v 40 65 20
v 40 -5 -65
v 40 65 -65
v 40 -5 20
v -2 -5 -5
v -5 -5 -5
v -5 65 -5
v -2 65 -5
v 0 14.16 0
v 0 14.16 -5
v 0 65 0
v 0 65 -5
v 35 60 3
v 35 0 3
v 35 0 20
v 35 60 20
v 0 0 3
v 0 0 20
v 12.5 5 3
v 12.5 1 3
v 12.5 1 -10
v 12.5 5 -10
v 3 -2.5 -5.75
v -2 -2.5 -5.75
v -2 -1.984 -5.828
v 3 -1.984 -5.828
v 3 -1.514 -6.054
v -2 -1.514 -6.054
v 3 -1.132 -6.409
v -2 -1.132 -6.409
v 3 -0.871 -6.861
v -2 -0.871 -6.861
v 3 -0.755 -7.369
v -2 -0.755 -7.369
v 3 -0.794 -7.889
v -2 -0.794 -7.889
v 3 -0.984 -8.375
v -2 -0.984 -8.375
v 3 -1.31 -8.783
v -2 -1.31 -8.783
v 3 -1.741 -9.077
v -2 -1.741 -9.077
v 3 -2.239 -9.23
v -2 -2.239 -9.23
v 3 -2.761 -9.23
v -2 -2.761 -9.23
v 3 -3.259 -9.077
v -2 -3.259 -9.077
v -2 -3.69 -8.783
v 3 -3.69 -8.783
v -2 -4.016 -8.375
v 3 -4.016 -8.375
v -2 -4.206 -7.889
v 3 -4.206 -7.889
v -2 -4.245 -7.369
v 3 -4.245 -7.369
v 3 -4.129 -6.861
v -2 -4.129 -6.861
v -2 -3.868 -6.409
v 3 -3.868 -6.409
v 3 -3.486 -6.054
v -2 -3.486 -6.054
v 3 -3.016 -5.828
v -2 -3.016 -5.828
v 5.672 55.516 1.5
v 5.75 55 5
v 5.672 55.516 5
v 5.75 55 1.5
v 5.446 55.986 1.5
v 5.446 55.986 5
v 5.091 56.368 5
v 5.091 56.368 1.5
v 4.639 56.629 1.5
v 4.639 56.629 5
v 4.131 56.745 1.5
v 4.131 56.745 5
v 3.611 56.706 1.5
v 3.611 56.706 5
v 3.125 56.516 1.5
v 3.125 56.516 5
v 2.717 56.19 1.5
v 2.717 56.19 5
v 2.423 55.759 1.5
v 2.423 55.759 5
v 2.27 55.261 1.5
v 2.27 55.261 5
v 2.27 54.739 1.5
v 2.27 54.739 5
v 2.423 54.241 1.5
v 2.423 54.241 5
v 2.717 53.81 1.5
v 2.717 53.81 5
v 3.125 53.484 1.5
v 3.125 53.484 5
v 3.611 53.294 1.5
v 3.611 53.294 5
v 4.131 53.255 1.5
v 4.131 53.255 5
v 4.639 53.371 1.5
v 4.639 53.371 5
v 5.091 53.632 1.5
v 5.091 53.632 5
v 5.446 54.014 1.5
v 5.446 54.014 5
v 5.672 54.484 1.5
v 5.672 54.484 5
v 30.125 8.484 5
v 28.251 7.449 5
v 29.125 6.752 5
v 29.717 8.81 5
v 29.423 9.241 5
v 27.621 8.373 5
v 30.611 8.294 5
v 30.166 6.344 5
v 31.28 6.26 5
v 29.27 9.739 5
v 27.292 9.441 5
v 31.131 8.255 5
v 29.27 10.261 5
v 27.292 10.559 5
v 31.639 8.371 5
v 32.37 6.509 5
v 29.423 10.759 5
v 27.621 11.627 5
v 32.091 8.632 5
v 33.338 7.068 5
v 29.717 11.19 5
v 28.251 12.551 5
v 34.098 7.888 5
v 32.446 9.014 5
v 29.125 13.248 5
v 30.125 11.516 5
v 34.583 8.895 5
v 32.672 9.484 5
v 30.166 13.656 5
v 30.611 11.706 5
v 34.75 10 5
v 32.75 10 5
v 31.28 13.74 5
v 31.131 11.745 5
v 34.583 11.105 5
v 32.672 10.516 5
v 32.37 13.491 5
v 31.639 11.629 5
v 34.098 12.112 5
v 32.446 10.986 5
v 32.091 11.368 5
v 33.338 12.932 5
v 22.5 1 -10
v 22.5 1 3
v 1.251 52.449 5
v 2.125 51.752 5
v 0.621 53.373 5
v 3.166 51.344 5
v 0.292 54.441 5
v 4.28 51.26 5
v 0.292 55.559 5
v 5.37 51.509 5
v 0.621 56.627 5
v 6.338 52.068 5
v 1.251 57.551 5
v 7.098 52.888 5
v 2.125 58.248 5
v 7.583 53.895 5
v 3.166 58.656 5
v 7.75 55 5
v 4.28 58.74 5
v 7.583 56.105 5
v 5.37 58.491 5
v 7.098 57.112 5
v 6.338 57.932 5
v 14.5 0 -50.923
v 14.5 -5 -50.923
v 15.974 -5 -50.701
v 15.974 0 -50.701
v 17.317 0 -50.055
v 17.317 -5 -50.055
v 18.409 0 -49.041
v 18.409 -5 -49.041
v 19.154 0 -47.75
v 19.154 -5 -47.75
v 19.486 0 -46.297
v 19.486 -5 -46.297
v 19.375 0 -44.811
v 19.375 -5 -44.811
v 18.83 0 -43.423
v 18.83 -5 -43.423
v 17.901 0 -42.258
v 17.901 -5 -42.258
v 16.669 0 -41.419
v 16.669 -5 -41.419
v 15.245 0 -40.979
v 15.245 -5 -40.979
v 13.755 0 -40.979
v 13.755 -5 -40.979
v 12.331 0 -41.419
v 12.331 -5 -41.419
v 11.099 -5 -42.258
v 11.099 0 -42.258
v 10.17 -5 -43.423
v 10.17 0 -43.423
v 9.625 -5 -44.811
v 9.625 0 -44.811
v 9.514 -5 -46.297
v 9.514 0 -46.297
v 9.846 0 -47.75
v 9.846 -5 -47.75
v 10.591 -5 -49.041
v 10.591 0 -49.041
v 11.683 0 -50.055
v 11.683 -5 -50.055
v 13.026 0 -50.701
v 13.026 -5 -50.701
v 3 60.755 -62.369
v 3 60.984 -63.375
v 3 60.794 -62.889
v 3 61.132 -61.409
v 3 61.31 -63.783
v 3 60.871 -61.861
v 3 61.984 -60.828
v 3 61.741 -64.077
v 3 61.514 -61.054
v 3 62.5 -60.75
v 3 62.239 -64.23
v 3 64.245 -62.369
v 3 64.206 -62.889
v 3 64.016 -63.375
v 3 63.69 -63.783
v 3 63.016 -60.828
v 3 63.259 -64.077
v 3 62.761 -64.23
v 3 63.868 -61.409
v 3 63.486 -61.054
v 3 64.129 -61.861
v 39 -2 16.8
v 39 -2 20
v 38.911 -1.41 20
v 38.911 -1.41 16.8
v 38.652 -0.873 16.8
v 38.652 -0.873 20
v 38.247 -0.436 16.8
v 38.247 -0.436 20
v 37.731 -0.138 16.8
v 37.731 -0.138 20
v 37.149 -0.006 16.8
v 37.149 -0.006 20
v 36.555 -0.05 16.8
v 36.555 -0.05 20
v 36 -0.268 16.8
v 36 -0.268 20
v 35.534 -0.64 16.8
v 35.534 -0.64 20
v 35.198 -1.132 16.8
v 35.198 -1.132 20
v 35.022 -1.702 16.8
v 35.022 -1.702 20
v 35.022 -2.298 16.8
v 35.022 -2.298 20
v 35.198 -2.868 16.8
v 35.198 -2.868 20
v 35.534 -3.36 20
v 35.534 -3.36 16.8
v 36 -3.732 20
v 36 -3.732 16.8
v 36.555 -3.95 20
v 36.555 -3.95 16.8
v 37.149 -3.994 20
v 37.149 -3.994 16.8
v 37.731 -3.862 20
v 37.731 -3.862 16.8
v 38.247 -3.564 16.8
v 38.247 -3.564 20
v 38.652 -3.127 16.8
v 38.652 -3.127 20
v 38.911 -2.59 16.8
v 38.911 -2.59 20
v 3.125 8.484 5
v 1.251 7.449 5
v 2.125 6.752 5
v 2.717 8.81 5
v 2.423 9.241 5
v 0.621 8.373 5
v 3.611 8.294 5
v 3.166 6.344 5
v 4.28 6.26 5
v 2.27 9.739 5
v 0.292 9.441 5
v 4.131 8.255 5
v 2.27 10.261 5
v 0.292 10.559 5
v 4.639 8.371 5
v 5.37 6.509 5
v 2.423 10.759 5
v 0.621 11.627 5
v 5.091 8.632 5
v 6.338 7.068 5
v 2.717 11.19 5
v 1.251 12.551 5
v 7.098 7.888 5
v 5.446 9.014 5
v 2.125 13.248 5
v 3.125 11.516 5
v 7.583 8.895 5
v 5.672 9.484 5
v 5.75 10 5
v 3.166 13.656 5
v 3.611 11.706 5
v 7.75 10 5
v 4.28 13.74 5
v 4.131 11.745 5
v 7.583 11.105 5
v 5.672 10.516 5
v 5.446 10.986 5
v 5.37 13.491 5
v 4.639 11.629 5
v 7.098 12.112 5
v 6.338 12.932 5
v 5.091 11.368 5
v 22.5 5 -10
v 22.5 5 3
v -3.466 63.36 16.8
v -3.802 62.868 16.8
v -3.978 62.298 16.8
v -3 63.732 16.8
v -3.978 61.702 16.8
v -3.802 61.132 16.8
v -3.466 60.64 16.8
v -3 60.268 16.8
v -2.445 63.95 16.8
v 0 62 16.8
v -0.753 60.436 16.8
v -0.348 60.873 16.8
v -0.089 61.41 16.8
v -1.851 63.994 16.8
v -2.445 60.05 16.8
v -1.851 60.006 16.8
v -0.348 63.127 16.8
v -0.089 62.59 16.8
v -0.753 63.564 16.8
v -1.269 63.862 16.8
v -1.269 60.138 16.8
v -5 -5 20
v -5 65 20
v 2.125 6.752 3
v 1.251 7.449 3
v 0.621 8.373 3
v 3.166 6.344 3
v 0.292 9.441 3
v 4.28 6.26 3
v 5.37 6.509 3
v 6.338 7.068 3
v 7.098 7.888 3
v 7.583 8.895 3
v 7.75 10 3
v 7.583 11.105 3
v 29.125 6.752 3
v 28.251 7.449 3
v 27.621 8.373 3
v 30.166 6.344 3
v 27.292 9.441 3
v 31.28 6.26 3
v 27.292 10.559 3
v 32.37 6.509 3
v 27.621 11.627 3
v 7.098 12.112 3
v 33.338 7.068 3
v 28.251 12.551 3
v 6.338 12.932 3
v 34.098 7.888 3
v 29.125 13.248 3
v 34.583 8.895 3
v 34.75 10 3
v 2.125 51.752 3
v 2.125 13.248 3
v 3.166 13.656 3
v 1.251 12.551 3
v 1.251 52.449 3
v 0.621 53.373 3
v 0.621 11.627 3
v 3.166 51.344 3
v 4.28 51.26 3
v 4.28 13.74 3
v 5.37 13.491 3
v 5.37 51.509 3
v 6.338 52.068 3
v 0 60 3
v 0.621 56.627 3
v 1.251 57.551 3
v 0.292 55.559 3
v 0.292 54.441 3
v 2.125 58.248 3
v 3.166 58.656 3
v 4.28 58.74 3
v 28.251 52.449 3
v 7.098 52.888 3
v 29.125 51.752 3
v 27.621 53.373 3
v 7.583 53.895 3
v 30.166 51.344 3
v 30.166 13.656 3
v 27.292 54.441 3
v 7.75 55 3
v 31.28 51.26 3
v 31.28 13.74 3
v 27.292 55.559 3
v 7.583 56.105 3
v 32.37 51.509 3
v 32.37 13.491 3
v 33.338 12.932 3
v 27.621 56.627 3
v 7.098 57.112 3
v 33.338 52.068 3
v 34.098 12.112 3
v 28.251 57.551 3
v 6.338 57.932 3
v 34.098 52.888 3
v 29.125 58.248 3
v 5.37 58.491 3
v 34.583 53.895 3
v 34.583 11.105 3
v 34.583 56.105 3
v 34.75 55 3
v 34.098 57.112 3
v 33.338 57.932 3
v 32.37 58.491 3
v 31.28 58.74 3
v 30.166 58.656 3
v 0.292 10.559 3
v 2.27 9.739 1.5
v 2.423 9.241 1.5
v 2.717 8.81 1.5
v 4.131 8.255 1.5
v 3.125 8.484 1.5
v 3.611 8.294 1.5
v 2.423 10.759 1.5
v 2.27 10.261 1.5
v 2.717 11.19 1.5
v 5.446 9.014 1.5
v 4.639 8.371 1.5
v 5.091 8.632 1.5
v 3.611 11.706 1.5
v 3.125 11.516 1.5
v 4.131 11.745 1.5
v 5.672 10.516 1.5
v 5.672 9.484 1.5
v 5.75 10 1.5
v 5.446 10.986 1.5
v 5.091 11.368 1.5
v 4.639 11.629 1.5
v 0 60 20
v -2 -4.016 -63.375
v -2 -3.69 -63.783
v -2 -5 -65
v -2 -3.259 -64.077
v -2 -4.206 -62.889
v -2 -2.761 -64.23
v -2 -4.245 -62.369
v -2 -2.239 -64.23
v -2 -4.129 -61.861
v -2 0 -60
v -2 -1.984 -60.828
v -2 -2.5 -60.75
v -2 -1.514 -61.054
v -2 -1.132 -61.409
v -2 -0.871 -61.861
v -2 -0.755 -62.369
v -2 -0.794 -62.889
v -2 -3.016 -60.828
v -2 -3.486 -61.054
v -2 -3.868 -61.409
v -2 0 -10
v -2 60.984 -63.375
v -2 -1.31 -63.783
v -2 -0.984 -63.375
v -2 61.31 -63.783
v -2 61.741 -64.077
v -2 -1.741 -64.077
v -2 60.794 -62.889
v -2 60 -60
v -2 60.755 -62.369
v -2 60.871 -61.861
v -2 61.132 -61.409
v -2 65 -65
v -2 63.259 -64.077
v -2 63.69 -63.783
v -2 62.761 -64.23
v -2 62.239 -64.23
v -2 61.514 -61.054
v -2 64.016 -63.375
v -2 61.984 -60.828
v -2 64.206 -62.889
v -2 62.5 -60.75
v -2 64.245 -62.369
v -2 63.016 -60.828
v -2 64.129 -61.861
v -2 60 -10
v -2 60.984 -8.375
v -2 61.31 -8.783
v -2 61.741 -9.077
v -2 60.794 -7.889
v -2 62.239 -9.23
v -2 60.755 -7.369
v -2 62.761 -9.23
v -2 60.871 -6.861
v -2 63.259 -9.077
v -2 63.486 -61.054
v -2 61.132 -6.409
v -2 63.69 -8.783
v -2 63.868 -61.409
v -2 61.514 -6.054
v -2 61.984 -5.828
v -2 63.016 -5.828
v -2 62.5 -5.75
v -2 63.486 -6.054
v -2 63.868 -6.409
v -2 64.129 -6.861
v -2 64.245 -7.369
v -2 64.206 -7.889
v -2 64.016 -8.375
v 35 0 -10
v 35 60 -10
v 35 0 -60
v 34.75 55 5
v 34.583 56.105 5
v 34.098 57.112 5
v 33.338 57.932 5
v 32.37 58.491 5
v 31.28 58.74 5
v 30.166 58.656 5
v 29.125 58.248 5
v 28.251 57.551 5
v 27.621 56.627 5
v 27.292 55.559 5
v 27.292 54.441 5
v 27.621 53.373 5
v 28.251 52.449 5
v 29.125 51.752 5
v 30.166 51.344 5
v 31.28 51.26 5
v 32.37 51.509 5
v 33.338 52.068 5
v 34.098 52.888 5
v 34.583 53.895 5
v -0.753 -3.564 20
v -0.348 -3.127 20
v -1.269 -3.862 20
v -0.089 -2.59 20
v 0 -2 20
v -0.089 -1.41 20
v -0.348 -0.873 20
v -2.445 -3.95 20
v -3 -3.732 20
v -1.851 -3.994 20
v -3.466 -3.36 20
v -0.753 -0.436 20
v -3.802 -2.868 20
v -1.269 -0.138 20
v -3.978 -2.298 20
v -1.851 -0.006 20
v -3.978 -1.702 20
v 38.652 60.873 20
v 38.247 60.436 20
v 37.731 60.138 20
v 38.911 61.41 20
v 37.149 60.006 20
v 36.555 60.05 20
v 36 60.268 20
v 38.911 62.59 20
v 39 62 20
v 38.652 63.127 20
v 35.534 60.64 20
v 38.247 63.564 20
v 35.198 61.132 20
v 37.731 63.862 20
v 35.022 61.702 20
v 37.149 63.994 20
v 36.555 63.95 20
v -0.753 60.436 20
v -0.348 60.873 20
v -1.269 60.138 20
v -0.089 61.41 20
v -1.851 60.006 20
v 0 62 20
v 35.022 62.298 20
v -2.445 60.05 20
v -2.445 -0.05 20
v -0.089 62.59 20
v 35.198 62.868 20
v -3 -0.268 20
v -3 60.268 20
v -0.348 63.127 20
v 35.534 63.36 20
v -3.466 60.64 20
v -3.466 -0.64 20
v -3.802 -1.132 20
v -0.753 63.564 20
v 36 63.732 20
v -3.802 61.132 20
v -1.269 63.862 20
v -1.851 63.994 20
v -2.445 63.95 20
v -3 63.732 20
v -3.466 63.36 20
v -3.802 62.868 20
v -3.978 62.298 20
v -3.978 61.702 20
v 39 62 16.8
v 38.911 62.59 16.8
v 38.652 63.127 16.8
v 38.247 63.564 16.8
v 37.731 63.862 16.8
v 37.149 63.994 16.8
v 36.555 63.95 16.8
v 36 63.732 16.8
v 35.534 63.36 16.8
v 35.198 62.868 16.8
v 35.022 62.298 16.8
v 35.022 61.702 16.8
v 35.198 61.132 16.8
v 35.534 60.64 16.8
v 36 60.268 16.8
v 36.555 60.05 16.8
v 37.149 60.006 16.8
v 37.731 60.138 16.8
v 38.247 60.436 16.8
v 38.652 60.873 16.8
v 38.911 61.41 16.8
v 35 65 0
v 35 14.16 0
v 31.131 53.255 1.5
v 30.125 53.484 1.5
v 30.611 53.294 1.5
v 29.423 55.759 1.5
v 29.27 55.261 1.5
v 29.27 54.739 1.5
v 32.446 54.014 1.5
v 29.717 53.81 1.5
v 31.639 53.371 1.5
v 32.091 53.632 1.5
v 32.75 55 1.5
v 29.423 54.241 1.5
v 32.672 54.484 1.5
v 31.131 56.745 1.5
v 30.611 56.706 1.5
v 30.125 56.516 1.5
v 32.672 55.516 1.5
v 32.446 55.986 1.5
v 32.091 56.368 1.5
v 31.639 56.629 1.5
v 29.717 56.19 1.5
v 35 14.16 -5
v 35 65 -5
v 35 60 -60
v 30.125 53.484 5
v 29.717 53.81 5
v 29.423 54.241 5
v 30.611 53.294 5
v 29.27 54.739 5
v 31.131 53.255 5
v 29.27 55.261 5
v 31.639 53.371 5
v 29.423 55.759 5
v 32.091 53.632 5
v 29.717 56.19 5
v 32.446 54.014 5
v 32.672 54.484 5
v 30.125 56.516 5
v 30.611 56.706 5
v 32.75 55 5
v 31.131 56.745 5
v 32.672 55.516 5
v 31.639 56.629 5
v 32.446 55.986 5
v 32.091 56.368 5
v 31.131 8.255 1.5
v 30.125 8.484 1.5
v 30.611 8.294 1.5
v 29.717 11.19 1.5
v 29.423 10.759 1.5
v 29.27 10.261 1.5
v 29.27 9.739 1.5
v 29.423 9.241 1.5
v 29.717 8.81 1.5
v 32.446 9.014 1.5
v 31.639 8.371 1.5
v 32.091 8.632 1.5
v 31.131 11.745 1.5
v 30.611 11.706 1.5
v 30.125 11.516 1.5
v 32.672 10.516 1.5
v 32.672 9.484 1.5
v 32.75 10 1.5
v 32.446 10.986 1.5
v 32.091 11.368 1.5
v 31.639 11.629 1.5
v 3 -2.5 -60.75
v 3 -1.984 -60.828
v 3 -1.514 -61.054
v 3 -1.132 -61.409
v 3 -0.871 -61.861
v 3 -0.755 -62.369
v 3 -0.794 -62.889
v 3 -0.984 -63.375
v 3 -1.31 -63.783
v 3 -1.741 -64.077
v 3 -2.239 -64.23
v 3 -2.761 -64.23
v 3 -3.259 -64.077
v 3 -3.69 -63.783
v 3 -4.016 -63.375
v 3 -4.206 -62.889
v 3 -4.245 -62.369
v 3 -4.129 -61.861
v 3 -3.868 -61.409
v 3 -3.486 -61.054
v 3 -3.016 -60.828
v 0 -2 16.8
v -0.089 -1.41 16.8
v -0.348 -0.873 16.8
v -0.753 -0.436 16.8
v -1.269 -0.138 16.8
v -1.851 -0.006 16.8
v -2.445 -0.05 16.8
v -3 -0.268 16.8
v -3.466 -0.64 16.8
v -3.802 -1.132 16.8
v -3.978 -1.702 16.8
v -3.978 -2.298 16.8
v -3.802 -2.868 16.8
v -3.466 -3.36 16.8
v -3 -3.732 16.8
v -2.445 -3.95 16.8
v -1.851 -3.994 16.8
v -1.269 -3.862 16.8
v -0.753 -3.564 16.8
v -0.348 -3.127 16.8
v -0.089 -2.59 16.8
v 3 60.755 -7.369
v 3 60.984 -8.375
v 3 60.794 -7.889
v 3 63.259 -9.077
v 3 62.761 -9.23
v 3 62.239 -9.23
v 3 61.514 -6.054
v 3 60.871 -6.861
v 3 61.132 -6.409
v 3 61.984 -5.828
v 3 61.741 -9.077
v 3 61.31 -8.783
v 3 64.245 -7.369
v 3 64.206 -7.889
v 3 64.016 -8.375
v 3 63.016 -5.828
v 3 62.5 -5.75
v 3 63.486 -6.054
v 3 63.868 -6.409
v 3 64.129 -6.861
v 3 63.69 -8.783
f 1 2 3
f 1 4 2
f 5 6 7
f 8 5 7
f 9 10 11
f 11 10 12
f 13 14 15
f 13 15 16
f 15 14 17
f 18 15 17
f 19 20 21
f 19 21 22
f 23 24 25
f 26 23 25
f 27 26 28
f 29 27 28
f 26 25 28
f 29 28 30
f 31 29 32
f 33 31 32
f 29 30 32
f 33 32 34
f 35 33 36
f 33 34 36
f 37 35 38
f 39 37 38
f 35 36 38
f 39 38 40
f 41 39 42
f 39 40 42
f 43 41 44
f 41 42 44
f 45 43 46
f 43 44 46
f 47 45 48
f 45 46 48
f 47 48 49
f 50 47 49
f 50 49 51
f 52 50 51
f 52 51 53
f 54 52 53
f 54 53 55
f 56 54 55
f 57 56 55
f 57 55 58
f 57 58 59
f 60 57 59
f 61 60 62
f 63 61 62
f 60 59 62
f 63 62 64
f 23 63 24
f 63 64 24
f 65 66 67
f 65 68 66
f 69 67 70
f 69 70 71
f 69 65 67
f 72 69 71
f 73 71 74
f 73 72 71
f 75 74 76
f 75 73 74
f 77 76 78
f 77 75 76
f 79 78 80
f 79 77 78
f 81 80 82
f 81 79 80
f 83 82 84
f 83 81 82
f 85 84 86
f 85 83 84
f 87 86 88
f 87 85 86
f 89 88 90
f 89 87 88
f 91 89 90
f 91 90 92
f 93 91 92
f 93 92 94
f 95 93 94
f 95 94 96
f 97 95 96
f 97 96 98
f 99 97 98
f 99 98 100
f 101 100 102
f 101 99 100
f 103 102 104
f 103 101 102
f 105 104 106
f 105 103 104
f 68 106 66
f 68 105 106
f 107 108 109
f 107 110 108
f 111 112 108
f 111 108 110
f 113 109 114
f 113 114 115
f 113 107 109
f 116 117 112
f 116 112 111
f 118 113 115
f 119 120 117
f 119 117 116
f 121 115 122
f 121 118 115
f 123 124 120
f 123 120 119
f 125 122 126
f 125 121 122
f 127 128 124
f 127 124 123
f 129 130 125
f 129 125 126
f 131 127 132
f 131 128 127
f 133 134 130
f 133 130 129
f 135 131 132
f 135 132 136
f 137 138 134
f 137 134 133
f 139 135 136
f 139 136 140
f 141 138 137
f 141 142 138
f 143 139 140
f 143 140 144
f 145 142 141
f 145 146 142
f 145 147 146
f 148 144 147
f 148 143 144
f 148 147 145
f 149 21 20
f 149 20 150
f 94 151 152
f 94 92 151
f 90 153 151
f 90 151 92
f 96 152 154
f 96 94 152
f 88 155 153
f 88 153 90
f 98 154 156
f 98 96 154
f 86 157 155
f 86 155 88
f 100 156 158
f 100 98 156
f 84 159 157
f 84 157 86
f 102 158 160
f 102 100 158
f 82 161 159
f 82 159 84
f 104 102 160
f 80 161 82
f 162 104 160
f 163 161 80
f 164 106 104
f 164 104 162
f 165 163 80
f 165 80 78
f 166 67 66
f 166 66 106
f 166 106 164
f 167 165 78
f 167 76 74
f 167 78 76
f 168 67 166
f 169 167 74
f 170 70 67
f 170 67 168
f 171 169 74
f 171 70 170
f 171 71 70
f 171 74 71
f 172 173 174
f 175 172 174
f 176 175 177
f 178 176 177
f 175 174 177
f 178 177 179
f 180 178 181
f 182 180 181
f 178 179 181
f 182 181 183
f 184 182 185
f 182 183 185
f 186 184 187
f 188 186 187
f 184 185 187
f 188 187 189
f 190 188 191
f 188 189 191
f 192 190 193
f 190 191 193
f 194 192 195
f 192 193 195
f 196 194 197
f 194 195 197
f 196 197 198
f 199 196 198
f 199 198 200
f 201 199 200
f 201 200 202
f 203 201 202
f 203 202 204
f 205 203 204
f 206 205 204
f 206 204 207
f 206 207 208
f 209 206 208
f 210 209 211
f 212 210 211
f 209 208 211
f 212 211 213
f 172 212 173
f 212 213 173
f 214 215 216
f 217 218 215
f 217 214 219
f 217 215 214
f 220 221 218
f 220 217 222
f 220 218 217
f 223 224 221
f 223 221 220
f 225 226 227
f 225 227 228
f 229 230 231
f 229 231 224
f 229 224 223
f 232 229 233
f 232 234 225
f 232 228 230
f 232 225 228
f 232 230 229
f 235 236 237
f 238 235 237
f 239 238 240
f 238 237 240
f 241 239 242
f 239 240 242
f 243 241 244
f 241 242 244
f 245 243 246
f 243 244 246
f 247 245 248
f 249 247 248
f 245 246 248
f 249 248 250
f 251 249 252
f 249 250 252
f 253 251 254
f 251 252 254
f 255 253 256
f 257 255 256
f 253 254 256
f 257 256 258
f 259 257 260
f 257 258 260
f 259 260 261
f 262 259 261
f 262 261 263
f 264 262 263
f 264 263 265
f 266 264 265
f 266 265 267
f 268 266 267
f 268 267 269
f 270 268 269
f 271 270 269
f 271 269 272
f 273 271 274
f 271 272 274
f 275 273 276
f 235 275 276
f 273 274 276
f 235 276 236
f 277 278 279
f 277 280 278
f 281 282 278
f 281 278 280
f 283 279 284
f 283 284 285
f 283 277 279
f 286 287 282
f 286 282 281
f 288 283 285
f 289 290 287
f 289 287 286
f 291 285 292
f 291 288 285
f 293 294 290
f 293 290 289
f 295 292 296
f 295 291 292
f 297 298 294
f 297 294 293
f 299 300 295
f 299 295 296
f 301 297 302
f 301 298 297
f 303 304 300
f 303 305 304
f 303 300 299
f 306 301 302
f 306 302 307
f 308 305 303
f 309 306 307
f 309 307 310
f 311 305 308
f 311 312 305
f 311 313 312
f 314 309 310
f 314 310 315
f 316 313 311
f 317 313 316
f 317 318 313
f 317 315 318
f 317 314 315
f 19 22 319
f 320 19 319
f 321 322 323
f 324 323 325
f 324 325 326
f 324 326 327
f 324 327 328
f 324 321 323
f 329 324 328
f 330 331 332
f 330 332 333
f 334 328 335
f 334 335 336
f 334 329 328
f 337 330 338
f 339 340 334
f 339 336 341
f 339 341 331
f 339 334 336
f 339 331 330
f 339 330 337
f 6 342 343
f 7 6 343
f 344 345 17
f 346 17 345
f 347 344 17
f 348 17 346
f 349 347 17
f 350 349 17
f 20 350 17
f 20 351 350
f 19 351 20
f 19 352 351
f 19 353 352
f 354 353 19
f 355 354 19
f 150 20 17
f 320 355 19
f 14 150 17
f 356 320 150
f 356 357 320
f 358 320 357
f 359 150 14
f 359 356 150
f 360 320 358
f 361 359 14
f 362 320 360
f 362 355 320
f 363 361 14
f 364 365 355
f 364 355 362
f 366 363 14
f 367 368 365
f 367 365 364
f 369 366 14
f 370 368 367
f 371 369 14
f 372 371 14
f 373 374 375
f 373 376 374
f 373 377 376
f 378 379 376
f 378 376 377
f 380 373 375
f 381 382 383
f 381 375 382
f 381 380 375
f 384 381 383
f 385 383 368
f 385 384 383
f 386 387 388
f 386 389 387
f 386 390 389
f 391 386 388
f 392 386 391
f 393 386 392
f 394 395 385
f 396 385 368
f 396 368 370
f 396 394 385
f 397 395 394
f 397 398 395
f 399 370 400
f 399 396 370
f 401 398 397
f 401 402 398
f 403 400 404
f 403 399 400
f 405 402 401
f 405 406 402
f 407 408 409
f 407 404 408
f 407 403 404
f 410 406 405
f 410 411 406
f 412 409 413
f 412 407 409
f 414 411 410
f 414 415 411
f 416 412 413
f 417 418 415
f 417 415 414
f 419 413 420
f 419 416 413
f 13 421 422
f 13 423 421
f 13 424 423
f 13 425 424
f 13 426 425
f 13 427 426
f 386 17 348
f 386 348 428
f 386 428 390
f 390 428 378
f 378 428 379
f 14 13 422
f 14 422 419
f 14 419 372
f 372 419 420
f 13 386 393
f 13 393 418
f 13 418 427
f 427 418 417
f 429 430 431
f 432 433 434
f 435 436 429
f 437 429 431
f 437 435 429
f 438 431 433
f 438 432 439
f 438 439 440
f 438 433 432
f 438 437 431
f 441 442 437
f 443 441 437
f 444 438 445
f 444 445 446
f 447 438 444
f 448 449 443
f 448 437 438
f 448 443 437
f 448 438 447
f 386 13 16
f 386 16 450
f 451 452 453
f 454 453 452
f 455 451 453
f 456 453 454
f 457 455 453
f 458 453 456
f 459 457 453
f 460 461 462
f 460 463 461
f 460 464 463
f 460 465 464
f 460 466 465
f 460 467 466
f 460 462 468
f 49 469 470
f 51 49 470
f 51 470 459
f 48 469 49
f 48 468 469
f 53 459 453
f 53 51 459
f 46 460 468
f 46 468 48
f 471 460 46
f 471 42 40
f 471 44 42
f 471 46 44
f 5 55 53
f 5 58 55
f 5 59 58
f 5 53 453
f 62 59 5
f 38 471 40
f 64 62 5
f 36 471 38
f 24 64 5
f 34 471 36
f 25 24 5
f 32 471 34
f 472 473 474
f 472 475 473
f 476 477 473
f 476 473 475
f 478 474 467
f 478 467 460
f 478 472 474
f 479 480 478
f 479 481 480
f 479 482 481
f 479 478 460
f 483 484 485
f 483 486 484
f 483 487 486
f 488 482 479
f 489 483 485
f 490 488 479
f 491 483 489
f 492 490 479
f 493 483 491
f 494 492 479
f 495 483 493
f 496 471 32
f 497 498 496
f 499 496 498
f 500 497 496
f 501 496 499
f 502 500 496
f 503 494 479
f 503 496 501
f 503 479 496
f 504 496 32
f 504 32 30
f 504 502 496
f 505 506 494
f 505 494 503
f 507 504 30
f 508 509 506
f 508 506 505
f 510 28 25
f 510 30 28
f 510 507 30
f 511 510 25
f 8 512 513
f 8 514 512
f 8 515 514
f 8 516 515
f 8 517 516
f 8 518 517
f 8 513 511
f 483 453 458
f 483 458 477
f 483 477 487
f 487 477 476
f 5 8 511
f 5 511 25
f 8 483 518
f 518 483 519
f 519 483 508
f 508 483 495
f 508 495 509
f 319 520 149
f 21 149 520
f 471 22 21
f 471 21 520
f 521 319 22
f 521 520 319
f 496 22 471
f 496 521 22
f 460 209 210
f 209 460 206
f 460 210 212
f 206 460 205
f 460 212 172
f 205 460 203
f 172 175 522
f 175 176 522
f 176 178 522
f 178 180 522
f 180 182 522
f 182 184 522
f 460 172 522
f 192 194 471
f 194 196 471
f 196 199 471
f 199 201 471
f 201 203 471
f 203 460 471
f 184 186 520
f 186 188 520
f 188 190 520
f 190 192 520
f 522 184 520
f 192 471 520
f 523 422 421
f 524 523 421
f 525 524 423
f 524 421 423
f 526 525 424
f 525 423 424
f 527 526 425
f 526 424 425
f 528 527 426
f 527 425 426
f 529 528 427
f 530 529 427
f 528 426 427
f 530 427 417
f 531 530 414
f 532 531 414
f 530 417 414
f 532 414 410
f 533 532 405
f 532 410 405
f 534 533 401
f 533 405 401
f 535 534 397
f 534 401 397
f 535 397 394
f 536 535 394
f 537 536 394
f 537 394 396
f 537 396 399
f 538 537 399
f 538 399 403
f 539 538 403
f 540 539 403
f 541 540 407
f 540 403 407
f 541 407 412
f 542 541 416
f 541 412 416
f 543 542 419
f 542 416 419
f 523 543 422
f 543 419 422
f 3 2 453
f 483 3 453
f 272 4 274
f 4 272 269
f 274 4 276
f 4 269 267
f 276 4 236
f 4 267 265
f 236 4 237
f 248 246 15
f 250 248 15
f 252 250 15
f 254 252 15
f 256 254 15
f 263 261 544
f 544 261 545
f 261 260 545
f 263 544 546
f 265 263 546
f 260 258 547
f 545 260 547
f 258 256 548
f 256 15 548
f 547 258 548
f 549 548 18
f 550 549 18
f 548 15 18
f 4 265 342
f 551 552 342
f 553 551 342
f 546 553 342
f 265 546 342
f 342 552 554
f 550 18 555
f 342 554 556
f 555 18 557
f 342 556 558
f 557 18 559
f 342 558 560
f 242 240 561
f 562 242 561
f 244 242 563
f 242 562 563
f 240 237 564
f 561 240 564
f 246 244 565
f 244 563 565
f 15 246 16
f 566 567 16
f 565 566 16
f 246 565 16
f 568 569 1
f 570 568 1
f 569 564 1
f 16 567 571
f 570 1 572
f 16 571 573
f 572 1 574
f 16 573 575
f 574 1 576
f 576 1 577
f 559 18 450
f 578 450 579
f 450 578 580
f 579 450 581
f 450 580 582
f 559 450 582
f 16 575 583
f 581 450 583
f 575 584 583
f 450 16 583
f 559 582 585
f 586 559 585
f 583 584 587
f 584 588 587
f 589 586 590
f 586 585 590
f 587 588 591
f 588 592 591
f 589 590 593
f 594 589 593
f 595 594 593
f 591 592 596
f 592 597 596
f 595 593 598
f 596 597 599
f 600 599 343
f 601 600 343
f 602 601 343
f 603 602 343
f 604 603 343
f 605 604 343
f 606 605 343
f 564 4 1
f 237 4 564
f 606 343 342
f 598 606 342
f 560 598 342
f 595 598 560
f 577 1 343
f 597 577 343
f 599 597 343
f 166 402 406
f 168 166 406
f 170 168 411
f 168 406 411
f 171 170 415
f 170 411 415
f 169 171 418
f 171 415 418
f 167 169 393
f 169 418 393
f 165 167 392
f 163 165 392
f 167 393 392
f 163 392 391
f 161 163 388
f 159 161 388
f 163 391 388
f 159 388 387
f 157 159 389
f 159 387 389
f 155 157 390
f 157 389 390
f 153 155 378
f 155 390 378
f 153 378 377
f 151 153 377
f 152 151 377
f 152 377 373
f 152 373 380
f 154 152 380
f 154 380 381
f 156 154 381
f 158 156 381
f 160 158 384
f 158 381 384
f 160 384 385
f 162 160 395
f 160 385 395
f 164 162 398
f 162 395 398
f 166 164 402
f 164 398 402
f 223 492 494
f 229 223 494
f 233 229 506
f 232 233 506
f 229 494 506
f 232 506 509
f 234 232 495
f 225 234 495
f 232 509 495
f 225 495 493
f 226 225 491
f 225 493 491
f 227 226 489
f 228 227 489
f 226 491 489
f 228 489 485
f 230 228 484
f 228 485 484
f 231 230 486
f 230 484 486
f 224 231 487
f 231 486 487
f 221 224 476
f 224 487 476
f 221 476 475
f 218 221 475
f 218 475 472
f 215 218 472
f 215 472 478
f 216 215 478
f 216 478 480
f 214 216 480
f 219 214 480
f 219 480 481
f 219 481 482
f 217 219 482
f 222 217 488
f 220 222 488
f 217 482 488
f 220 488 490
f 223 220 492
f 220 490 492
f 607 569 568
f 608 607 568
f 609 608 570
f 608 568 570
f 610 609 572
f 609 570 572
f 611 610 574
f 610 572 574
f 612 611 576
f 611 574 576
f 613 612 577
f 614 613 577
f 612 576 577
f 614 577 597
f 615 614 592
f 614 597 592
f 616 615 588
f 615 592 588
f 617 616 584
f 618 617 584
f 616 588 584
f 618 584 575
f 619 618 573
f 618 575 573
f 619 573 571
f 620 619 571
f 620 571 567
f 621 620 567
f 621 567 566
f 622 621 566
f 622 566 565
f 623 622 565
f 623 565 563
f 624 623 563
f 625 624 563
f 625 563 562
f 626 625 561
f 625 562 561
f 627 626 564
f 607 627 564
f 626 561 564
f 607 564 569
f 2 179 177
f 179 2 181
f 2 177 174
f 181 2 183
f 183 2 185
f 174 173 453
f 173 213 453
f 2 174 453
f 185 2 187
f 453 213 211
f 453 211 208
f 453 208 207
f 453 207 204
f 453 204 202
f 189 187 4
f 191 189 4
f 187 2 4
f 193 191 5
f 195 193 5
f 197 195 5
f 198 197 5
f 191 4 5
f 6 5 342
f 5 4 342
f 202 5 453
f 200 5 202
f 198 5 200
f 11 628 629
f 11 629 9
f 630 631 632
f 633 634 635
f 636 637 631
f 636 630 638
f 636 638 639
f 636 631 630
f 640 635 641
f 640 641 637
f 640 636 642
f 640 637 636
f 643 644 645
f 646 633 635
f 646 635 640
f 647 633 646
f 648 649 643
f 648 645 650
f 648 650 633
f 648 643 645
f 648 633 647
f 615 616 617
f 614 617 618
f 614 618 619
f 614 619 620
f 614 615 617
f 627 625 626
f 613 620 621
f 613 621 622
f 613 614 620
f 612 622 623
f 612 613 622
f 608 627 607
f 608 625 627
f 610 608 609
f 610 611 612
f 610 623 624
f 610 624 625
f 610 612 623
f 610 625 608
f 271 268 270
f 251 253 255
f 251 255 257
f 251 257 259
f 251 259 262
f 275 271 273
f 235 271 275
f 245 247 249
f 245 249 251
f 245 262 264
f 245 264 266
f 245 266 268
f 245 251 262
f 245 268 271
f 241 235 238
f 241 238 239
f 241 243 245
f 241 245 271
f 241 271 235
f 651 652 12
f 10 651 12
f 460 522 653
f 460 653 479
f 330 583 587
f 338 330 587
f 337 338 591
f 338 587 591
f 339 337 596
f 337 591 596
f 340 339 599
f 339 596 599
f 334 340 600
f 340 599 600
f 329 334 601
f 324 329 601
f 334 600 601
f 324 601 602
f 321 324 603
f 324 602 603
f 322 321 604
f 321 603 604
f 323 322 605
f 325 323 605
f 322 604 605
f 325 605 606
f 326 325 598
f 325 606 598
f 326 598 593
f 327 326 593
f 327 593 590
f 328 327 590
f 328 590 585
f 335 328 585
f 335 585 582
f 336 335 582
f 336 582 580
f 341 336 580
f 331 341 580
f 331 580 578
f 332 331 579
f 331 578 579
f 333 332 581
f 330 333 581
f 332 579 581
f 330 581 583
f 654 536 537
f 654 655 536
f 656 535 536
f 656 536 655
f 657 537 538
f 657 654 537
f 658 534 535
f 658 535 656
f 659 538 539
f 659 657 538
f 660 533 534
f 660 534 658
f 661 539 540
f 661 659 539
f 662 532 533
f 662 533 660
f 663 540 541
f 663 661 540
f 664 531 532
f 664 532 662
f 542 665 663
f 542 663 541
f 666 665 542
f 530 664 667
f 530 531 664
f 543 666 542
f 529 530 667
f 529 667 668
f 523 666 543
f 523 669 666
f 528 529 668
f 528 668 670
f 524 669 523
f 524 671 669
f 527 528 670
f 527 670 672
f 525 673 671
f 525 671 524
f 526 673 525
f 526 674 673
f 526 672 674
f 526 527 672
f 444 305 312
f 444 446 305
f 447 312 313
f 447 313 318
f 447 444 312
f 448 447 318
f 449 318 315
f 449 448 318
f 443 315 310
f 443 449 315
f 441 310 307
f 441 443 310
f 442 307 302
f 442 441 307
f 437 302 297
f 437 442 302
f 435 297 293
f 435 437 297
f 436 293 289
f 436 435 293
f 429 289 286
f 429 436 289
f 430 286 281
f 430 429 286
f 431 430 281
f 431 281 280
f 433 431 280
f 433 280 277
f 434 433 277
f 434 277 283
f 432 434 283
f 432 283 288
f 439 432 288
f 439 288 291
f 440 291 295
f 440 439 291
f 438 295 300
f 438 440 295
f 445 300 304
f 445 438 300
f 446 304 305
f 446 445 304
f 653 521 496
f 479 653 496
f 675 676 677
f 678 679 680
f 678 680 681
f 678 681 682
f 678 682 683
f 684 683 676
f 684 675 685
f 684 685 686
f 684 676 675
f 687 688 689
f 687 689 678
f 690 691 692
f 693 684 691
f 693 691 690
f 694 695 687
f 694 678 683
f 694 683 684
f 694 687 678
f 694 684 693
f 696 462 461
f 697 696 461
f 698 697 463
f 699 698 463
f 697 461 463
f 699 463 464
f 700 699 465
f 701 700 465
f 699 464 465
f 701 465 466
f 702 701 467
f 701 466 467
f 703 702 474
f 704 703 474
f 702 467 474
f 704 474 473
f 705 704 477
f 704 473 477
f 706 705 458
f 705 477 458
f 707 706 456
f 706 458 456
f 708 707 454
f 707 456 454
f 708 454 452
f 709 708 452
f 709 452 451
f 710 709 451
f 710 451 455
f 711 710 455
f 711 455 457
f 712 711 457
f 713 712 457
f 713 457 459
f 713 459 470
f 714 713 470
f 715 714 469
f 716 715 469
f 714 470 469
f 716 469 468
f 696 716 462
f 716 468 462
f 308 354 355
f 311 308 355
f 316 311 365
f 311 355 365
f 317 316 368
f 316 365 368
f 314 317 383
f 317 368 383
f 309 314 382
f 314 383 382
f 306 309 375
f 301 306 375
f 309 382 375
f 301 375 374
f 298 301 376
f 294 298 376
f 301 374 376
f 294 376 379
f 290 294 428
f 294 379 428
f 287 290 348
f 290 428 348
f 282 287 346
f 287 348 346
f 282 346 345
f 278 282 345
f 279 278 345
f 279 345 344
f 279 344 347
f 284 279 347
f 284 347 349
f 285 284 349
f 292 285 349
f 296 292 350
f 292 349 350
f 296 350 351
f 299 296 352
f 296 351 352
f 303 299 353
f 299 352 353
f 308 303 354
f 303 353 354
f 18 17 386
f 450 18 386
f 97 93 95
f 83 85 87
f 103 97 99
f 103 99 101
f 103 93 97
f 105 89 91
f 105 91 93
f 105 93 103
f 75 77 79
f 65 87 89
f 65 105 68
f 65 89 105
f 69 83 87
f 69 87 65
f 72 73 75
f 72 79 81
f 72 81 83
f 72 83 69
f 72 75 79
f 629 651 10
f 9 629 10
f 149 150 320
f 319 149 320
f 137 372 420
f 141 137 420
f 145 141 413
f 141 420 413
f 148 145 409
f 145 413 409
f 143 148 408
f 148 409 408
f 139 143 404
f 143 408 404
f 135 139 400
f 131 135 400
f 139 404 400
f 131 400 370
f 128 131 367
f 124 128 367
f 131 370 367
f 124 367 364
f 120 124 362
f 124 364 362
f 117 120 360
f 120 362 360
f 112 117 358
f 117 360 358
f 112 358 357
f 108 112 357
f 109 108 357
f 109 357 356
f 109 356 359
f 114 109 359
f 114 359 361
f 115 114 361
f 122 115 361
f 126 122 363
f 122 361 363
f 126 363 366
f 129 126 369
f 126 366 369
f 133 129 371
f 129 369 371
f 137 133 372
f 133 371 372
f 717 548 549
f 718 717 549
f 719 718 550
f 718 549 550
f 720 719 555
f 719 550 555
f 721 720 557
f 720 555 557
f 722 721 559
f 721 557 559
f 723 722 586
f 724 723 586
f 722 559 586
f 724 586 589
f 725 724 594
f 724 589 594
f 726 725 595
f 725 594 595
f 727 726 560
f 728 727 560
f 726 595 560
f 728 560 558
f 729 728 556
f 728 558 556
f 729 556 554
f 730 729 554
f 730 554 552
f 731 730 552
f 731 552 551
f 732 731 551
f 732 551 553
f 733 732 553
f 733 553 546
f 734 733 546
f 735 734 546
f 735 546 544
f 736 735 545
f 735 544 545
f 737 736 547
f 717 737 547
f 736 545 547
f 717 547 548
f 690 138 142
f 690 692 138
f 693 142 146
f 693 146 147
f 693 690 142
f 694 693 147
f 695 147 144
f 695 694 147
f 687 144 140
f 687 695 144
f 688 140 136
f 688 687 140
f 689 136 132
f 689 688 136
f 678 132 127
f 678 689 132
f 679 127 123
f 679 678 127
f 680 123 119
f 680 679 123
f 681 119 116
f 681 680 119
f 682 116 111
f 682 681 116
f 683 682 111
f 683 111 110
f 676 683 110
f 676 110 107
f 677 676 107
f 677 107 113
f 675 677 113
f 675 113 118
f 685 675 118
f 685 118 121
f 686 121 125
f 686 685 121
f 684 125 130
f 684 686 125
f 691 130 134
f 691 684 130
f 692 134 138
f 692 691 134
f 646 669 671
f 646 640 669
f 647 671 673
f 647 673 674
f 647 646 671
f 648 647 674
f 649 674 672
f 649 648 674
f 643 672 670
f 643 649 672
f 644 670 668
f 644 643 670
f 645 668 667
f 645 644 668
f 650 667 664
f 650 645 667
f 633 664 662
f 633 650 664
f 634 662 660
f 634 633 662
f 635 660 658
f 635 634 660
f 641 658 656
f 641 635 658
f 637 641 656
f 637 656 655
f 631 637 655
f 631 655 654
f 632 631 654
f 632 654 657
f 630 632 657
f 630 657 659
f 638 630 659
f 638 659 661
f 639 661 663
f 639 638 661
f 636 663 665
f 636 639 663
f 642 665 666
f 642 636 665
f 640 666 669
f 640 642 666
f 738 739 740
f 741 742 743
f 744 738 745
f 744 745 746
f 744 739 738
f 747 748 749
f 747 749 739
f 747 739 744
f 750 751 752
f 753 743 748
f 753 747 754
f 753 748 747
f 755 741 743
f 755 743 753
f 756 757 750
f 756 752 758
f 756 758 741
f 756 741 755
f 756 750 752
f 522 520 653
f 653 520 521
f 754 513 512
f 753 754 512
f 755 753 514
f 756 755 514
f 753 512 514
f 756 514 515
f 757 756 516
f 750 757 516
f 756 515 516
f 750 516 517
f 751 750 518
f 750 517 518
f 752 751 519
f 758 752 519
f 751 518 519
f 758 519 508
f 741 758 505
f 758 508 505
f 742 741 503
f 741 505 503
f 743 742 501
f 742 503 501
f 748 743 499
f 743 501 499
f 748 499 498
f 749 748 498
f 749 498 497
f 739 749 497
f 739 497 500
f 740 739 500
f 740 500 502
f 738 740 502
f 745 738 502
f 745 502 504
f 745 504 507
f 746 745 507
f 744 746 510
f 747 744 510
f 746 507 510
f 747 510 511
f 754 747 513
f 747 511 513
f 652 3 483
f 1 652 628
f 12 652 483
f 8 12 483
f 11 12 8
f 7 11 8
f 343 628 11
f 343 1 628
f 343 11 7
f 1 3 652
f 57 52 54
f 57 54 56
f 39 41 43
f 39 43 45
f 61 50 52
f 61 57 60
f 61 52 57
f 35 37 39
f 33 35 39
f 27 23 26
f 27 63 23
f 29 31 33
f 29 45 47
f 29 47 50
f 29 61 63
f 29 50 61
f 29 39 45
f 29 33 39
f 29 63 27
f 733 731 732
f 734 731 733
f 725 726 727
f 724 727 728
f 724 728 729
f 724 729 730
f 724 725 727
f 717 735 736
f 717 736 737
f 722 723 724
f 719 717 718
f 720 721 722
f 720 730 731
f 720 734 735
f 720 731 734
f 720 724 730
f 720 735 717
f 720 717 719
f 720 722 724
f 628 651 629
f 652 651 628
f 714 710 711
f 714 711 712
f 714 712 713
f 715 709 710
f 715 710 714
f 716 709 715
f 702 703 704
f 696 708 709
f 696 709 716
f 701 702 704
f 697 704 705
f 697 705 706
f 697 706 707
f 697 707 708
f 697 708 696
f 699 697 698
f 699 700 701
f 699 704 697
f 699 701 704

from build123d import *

# Parameters (mm, degrees)
SKICA1_W                    = 35
SKICA1_H                    = 60
P_IDAT_VYSUNUT_M1_DEPTH     = 3
SKICA3_W                    = 45
SKICA3_H                    = 70
SKICA3_W_2                  = 35
SKICA3_H_2                  = 60
VYSUNOUT_TENKOST_NN_1_DEPTH = 20
SKICA4_R                    = 3.75
SKICA4_R_2                  = 1.75
VYSUNOUT_TENKOST_NN_2_DEPTH = 2
ODEBRAT_START               = -1.5
SKICA5_R                    = 1.75
ODEBRAT_VYSUNUT_M1_DEPTH    = 1.5
SKICA10_W                   = 45
SKICA10_H                   = 70
P_IDAT_VYSUNUT_M2_DEPTH     = 5
SKICA12_W                   = 35
SKICA12_H                   = 50.840130339
ODEBRAT_VYSUNUT_M5_DEPTH    = 5
SKICA13_W                   = 45
SKICA13_H                   = 70
P_IDAT_VYSUNUT_M3_DEPTH     = 5
P_IDAT_VYSUNUT_M5_DEPTH     = 50
SKICA17_W                   = 45
SKICA17_H                   = 70
P_IDAT_VYSUNUT_M6_DEPTH     = 5
SKICA7_R                    = 2
ODEBRAT_VYSUNUT_M3_DEPTH    = 3.2
ODEBRAT_VYSUNUT_M6_REACH    = 104.22
SKICA8_W                    = 10
SKICA8_H                    = 4
SKICA21_W                   = 60
SKICA21_H                   = 70
ODEBRAT_VYSUNUT_M7_DEPTH    = 3
SKICA22_R                   = 1.75
ODEBRAT_VYSUNUT_M8_DEPTH    = 5
SKICA23_R                   = 5
ODEBRAT_VYSUNUT_M9_DEPTH    = 5


with BuildPart() as part:
    # Skica1 → Přidat vysunutím1 (new body)
    with BuildSketch(Plane.XY):
        with Locations((17.5, 30)):
            Rectangle(SKICA1_W, SKICA1_H)
    extrude(amount=P_IDAT_VYSUNUT_M1_DEPTH)

    # Skica3 → Vysunout tenkostěnný1 (add)
    with BuildSketch(Plane(origin=(0, 0, 0), x_dir=(-1, 0, 0), z_dir=(0, 0, -1))):
        with Locations((-17.5, 30)):
            Rectangle(SKICA3_W, SKICA3_H)
        with Locations((-17.5, 30)):
            Rectangle(SKICA3_W_2, SKICA3_H_2, mode=Mode.SUBTRACT)
    extrude(amount=-VYSUNOUT_TENKOST_NN_1_DEPTH)

    # Skica4 → Vysunout tenkostěnný2 (add)
    # profile 1 of 4: a face of its own
    with BuildSketch(Plane.XY.offset(3)):
        with Locations((4, 55)):
            Circle(SKICA4_R)
        with Locations((4, 55)):
            Circle(SKICA4_R_2, mode=Mode.SUBTRACT)
    # profile 2 of 4: a face of its own
    with BuildSketch(Plane.XY.offset(3)):
        with Locations((31, 55)):
            Circle(SKICA4_R)
        with Locations((31, 55)):
            Circle(SKICA4_R_2, mode=Mode.SUBTRACT)
    # profile 3 of 4: a face of its own
    with BuildSketch(Plane.XY.offset(3)):
        with Locations((31, 10)):
            Circle(SKICA4_R)
        with Locations((31, 10)):
            Circle(SKICA4_R_2, mode=Mode.SUBTRACT)
    # profile 4 of 4: a face of its own
    with BuildSketch(Plane.XY.offset(3)):
        with Locations((4, 10)):
            Circle(SKICA4_R)
        with Locations((4, 10)):
            Circle(SKICA4_R_2, mode=Mode.SUBTRACT)
    extrude(amount=VYSUNOUT_TENKOST_NN_2_DEPTH)

    # Skica5 → Odebrat vysunutím1 (cut)
    with BuildSketch(Plane.XY.offset(3).offset(ODEBRAT_START)):
        with Locations((4, 55)):
            Circle(SKICA5_R)
        with Locations((31, 55)):
            Circle(SKICA5_R)
        with Locations((31, 10)):
            Circle(SKICA5_R)
        with Locations((4, 10)):
            Circle(SKICA5_R)
    extrude(amount=ODEBRAT_VYSUNUT_M1_DEPTH, mode=Mode.SUBTRACT)

    # Skica10 → Přidat vysunutím2 (add)
    with BuildSketch(Plane(origin=(0, 0, 0), x_dir=(-1, 0, 0), z_dir=(0, 0, -1))):
        with Locations((-17.5, 30)):
            Rectangle(SKICA10_W, SKICA10_H)
    extrude(amount=P_IDAT_VYSUNUT_M2_DEPTH)

    # Skica12 → Odebrat vysunutím5 (cut)
    with BuildSketch(Plane(origin=(0, 0, -5), x_dir=(-1, 0, 0), z_dir=(0, 0, -1))):
        with Locations((-17.5, 39.579934831)):
            Rectangle(SKICA12_W, SKICA12_H)
    extrude(amount=-ODEBRAT_VYSUNUT_M5_DEPTH, mode=Mode.SUBTRACT)

    # Skica13 → Přidat vysunutím3 (add)
    with BuildSketch(Plane(origin=(0, 0, -5), x_dir=(-1, 0, 0), z_dir=(0, 0, -1))):
        with Locations((-17.5, 30)):
            Rectangle(SKICA13_W, SKICA13_H)
    extrude(amount=P_IDAT_VYSUNUT_M3_DEPTH)

    # Skica16 → Přidat vysunutím5 (add)
    with BuildSketch(Plane(origin=(0, 0, -10), x_dir=(-1, 0, 0), z_dir=(0, 0, -1))):
        Polygon((-37, -5), (5, -5), (5, 0), (-35, 0), (-35, 60), (5, 60), (5, 65), (-37, 65), (-40, 65), (-40, 62), (-40, -2), (-40, -5), align=None)
    extrude(amount=P_IDAT_VYSUNUT_M5_DEPTH)

    # Skica17 → Přidat vysunutím6 (add)
    with BuildSketch(Plane(origin=(0, 0, -60), x_dir=(-1, 0, 0), z_dir=(0, 0, -1))):
        with Locations((-17.5, 30)):
            Rectangle(SKICA17_W, SKICA17_H)
    extrude(amount=P_IDAT_VYSUNUT_M6_DEPTH)

    # Skica7 → Odebrat vysunutím3 (cut)
    with BuildSketch(Plane.XY.offset(20)):
        with Locations((37, 62)):
            Circle(SKICA7_R)
        with Locations((-2, 62)):
            Circle(SKICA7_R)
        with Locations((-2, -2)):
            Circle(SKICA7_R)
        with Locations((37, -2)):
            Circle(SKICA7_R)
    extrude(amount=-ODEBRAT_VYSUNUT_M3_DEPTH, mode=Mode.SUBTRACT)

    # Skica8 → Odebrat vysunutím6 (cut, up to next)
    with BuildSketch(Plane.XY.offset(3), mode=Mode.PRIVATE) as odebrat_vysunut_m6_sk1:
        with Locations((17.5, 3)):
            Rectangle(SKICA8_W, SKICA8_H)
    odebrat_vysunut_m6_tool1 = extrude(odebrat_vysunut_m6_sk1.sketch, amount=-ODEBRAT_VYSUNUT_M6_REACH, mode=Mode.PRIVATE) & part.part
    add(odebrat_vysunut_m6_tool1.solids().sort_by_distance((17.5, 3, 3))[0], mode=Mode.SUBTRACT)

    # Skica21 → Odebrat vysunutím7 (cut)
    with BuildSketch(Plane.ZY.offset(5)):
        with Locations((-35, 30)):
            Rectangle(SKICA21_W, SKICA21_H)
    extrude(amount=-ODEBRAT_VYSUNUT_M7_DEPTH, mode=Mode.SUBTRACT)

    # Skica22 → Odebrat vysunutím8 (cut)
    with BuildSketch(Plane.ZY.offset(2)):
        with Locations((-7.5, 62.5)):
            Circle(SKICA22_R)
        with Locations((-7.5, -2.5)):
            Circle(SKICA22_R)
        with Locations((-62.5, -2.5)):
            Circle(SKICA22_R)
        with Locations((-62.5, 62.5)):
            Circle(SKICA22_R)
    extrude(amount=-ODEBRAT_VYSUNUT_M8_DEPTH, mode=Mode.SUBTRACT)

    # Skica23 → Odebrat vysunutím9 (cut)
    with BuildSketch(Plane.XZ.offset(5)):
        with Locations(Location((14.5, -45.923378455, 0), (0, 0, 270))):
            Circle(SKICA23_R)
    extrude(amount=-ODEBRAT_VYSUNUT_M9_DEPTH, mode=Mode.SUBTRACT)


solid = part.part
